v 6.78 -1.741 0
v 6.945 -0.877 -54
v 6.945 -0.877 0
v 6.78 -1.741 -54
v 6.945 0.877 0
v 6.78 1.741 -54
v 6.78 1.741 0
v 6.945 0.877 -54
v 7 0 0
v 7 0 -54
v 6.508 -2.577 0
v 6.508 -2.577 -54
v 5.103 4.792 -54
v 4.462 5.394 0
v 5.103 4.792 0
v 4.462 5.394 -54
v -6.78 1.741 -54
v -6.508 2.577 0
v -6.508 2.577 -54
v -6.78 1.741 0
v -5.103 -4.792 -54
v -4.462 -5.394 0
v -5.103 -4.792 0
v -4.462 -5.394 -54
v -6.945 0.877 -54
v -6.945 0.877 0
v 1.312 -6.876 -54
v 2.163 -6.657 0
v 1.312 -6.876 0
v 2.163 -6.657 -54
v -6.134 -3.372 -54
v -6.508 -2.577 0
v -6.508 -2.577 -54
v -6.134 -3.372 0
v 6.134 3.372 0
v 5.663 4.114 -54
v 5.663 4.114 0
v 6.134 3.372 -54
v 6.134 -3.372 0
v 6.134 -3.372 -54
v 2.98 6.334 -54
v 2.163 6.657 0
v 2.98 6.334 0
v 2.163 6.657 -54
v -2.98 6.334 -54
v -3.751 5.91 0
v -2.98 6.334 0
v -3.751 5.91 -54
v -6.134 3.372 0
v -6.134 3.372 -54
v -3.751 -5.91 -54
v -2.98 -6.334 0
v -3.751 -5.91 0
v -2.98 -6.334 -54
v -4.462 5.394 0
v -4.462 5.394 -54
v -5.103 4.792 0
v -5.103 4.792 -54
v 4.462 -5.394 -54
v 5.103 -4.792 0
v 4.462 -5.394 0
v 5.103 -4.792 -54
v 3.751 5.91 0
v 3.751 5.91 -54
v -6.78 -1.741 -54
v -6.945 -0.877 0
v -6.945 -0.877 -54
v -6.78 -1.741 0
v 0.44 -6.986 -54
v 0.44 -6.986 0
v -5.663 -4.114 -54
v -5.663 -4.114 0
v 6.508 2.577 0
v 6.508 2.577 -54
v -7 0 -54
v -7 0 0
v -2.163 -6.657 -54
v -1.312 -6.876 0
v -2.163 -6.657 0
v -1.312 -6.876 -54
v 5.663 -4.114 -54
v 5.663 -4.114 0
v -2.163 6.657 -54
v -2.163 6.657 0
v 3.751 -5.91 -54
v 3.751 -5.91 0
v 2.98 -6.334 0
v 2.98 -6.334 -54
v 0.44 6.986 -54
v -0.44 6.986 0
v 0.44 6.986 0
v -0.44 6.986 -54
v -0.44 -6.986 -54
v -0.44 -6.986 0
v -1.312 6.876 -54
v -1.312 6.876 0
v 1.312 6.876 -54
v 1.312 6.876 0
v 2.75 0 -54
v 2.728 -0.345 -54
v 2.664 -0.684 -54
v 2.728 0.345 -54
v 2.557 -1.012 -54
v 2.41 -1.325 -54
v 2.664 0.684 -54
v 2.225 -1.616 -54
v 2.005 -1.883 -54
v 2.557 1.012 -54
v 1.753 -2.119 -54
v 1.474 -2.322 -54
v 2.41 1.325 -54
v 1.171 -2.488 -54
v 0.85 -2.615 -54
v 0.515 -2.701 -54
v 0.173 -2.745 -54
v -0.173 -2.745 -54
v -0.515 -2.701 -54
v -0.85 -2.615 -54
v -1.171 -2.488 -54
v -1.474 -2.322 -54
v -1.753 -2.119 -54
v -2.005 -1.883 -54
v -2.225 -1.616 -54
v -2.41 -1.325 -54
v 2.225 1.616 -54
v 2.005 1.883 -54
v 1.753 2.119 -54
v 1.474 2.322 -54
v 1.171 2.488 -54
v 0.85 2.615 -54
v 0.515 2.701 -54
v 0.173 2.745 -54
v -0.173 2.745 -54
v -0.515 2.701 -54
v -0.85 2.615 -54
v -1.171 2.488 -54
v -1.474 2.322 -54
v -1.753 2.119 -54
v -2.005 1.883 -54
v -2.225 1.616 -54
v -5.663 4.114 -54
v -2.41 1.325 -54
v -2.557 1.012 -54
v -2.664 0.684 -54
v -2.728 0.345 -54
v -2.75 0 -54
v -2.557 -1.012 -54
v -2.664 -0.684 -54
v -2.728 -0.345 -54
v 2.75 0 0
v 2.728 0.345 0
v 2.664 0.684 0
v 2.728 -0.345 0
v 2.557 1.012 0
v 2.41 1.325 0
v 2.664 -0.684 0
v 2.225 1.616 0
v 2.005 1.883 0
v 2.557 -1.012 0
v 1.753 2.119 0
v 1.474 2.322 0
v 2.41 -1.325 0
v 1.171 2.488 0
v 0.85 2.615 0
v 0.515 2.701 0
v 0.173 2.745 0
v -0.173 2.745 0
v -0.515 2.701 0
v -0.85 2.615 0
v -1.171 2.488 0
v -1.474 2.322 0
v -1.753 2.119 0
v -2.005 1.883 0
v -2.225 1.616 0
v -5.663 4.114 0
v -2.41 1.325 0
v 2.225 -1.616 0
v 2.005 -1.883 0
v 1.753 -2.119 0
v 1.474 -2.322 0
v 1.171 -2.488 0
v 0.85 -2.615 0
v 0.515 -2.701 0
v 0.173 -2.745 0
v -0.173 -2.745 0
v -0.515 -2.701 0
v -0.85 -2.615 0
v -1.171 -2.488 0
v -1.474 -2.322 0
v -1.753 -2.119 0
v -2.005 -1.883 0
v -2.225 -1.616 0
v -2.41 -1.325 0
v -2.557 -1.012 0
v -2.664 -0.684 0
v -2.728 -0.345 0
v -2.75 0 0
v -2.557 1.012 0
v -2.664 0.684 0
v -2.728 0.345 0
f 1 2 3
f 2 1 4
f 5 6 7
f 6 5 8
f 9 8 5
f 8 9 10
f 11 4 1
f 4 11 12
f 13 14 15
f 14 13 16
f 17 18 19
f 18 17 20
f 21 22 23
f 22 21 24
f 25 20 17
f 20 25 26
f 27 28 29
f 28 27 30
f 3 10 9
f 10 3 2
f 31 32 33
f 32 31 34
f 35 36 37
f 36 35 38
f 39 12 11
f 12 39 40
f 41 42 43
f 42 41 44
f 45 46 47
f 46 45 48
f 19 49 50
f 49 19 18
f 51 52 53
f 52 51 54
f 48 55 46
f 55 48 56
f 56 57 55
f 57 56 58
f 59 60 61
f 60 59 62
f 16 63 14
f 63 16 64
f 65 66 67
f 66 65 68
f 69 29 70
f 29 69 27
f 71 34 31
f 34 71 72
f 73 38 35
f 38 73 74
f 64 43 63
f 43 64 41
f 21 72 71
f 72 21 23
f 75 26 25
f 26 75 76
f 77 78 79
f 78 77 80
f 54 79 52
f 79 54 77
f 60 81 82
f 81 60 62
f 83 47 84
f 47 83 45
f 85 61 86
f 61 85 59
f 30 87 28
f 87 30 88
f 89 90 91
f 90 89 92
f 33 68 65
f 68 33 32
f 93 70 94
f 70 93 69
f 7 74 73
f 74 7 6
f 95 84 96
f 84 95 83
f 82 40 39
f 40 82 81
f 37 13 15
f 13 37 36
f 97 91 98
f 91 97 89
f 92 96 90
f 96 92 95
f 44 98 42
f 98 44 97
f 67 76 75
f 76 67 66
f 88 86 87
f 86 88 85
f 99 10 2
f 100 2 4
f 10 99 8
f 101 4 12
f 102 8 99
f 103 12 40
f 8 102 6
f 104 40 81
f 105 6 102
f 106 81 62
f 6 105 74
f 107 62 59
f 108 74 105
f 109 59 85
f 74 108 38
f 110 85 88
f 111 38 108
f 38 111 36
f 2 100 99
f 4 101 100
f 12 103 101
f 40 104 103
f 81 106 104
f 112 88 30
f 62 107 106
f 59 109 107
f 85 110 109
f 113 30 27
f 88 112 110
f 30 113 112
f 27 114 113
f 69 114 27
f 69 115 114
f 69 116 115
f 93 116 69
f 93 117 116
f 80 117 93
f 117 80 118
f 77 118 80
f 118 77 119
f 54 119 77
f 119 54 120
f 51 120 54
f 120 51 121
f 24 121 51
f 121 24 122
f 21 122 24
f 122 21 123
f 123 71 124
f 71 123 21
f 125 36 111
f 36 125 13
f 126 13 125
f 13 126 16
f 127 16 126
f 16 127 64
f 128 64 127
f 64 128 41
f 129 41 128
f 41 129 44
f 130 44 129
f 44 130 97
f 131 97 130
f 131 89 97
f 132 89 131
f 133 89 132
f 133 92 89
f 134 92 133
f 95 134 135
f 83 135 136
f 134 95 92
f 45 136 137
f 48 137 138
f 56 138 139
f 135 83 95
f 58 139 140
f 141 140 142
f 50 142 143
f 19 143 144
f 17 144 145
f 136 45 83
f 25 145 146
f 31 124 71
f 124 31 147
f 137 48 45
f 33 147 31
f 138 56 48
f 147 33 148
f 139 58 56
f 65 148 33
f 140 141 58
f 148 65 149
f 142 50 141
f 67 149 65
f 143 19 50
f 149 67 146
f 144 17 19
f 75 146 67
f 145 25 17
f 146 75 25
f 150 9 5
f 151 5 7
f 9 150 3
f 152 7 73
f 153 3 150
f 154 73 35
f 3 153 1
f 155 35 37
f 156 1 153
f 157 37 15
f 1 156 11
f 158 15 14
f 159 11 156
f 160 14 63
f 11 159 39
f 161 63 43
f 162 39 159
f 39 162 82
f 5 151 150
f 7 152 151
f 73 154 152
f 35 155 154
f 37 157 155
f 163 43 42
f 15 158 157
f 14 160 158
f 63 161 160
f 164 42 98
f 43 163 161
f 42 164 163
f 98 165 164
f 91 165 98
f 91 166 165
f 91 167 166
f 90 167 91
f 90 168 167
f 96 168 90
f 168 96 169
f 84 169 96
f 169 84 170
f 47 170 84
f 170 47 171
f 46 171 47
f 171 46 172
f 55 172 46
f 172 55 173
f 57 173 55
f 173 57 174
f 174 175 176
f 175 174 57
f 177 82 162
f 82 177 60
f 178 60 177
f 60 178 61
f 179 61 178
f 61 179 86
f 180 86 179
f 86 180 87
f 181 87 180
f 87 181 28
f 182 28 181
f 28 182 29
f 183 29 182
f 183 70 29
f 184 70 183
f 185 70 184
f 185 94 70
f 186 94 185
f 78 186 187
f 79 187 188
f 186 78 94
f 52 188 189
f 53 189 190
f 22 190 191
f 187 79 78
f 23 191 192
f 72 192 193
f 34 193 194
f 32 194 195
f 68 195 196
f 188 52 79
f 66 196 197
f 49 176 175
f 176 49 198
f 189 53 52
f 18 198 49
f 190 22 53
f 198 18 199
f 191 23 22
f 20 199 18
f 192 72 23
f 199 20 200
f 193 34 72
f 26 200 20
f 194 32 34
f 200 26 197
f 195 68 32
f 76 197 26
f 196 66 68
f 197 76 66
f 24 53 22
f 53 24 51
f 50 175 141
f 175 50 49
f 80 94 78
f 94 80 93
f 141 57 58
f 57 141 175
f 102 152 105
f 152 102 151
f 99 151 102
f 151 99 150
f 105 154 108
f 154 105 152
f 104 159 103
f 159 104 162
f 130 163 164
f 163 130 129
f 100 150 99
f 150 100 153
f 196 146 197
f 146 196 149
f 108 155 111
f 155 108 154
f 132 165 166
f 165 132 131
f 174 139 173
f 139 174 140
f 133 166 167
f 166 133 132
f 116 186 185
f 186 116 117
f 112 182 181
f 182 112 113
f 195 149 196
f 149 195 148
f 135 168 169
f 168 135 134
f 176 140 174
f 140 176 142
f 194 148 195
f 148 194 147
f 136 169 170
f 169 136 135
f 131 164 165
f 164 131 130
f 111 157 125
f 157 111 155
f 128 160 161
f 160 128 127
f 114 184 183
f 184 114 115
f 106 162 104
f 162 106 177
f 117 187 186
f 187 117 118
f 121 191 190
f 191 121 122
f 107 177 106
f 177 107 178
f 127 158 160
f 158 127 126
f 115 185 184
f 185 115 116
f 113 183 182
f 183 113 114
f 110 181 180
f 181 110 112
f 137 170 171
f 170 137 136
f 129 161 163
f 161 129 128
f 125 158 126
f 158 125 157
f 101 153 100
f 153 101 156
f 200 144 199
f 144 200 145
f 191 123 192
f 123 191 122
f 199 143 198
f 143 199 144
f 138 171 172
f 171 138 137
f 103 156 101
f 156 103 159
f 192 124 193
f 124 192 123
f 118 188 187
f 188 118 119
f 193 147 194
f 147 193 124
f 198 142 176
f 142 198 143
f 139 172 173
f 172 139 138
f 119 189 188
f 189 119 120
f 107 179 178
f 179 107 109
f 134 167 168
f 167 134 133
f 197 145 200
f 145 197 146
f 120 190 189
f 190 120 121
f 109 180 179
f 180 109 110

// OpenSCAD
$fn = 50;


difference() {
	union() {
		translate(v = [0, 0, -54.0000000000]) {
			cylinder(h = 54, r = 7.0000000000);
		}
		cylinder(h = 0, r = 10.0000000000);
	}
	union() {
		#translate(v = [0, 0, -54]) {
			cylinder(h = 54, r = 2.7500000000);
		}
	}
}
